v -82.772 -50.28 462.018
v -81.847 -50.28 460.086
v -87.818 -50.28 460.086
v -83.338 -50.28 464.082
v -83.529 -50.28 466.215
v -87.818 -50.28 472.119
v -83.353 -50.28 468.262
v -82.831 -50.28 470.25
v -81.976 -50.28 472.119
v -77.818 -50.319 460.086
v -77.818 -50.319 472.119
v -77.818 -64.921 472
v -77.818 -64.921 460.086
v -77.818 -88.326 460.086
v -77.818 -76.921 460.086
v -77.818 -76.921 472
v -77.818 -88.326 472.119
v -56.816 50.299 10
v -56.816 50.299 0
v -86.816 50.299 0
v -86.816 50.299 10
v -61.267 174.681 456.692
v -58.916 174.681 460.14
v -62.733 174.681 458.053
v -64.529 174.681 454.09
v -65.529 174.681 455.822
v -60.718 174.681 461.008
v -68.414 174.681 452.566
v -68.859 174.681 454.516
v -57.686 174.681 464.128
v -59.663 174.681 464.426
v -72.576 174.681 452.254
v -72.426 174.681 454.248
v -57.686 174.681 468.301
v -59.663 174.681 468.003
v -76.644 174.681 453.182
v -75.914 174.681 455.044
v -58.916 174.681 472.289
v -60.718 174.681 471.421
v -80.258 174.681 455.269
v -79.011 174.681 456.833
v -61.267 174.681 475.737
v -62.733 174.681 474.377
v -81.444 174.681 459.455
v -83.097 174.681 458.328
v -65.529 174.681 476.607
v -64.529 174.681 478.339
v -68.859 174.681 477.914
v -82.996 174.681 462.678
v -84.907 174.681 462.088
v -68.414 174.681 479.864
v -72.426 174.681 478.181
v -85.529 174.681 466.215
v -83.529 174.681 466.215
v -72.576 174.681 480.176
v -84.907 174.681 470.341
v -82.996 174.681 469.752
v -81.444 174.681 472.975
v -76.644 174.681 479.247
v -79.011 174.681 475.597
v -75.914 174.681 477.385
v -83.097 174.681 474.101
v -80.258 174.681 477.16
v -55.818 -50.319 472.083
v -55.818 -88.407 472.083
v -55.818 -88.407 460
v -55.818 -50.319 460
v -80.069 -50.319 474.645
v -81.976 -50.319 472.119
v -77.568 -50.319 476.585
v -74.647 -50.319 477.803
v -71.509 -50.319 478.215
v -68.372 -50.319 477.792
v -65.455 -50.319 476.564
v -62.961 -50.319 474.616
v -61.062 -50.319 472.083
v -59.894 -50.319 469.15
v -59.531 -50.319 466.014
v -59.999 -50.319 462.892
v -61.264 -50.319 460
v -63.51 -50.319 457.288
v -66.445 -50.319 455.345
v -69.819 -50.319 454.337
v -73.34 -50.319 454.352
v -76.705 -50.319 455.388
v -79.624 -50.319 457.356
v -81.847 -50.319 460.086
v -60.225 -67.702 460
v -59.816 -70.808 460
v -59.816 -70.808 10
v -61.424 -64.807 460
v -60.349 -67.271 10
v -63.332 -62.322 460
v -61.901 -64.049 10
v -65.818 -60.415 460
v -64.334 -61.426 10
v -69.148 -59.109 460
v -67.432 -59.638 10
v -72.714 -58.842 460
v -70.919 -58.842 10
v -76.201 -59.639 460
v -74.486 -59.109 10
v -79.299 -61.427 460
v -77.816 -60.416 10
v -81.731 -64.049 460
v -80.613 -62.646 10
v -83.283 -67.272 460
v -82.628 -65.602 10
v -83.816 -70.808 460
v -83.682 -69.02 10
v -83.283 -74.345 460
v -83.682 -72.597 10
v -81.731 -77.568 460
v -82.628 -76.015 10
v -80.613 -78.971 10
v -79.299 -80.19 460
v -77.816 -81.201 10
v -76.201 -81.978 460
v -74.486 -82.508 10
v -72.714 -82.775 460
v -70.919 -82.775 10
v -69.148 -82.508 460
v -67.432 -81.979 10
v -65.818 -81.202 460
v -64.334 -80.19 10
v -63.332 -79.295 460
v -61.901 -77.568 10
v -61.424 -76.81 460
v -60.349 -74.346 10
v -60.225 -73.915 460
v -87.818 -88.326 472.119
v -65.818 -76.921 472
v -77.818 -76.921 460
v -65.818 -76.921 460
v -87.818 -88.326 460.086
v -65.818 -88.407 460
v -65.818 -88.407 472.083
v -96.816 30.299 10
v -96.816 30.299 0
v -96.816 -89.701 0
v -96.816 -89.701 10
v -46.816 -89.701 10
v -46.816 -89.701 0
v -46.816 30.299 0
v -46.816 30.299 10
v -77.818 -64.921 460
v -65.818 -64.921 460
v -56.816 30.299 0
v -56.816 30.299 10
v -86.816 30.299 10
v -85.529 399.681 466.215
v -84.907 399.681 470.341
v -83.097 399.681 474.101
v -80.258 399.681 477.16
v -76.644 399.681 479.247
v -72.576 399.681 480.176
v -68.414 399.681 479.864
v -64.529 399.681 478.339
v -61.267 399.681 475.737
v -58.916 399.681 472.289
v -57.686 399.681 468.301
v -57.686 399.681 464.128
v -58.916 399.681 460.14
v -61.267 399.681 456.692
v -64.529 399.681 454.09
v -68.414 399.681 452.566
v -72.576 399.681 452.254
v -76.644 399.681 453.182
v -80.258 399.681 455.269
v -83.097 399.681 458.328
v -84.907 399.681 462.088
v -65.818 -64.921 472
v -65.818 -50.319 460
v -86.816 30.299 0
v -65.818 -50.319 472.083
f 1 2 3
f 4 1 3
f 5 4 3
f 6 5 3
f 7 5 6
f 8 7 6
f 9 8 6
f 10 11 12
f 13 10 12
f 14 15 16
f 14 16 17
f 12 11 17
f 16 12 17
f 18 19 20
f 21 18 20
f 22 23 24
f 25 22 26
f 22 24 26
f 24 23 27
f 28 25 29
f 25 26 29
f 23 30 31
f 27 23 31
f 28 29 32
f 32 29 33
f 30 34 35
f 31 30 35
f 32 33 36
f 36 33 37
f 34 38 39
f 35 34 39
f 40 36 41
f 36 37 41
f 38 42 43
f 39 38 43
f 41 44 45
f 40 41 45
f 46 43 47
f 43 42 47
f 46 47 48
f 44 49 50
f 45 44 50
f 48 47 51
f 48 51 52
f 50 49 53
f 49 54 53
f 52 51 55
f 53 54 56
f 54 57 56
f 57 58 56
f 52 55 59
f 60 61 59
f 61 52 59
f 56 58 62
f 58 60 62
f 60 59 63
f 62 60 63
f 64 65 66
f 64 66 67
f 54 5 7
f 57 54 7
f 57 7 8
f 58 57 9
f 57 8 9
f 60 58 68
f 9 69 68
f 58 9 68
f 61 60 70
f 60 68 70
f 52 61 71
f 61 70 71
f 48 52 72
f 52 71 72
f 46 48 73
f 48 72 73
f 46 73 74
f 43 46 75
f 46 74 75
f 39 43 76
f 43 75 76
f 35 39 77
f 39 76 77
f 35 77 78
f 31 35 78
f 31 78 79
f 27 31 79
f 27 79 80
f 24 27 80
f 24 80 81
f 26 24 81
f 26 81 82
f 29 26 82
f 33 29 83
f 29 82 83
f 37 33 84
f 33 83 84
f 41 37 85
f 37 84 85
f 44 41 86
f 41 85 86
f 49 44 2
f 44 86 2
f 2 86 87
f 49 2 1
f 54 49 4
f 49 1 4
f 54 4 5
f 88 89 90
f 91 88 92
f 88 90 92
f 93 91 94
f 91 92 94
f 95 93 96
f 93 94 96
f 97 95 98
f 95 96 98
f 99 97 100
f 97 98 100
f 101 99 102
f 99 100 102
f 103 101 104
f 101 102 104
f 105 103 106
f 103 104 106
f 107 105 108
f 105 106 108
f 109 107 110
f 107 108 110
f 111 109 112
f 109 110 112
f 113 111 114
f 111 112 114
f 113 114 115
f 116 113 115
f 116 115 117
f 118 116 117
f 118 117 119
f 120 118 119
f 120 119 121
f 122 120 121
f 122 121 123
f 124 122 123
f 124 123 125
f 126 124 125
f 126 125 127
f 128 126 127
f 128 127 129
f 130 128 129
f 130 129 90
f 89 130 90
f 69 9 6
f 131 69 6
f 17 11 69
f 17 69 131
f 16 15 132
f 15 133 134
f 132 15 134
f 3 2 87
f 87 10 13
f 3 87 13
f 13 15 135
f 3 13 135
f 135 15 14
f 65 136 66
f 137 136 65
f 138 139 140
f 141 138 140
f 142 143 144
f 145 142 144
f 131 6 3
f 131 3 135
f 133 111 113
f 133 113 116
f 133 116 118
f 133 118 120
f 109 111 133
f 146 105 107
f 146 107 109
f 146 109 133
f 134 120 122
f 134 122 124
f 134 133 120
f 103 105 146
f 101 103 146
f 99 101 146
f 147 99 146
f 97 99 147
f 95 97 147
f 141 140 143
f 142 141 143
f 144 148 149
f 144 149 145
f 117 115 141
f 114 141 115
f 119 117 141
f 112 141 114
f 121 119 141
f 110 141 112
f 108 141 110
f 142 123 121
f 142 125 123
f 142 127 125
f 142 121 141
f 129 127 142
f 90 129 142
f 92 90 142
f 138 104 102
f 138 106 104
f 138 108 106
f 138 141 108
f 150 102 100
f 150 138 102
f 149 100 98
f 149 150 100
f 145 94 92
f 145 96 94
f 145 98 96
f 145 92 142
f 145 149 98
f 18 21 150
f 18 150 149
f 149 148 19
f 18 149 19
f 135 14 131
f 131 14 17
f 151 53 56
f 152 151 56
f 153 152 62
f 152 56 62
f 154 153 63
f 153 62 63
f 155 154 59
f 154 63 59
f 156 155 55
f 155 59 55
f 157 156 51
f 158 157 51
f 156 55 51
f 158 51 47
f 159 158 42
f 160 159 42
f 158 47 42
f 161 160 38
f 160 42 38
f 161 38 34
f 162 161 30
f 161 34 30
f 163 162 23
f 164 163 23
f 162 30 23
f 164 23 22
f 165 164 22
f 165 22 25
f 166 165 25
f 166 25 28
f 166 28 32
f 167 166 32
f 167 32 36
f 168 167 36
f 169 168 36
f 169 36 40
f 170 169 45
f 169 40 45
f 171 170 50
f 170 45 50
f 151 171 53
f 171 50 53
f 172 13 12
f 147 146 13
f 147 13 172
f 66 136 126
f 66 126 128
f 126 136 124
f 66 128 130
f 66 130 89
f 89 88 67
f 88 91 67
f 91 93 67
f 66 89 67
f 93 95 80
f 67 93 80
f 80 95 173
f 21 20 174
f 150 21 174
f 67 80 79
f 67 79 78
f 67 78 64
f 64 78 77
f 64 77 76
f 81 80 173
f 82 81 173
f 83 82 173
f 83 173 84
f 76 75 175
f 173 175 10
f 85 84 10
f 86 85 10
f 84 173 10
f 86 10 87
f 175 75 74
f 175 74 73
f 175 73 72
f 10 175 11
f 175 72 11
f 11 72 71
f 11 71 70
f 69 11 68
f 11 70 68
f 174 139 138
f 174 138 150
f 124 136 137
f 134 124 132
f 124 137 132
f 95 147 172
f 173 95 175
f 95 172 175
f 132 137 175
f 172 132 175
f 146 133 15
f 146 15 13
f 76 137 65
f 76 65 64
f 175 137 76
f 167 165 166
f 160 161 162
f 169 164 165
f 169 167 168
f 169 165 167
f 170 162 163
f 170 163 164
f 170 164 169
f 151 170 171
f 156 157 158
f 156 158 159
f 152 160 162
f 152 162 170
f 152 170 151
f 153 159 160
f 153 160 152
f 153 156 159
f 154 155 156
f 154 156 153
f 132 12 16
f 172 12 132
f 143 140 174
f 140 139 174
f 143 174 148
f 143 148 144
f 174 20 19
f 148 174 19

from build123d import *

# Parameters (mm, degrees)
F0_W      = 10
F0_H      = 20
F1_DEPTH  = 10
F2_R      = 12
F3_DEPTH  = 450
F4_W      = 12
F4_H      = 12
F5_DEPTH  = 12
F6_W      = 38.0882956088
F6_H      = 12.0832407475
F7_DEPTH  = 10
F8_W      = 38.0462743342
F8_H      = 12.0327174664
F9_DEPTH  = 10
F10_R     = 12
F11_DEPTH = 225
F12_R     = 14
F13_DEPTH = 225


with BuildPart() as f1:
    # F0 (on Top) → F1 (new body)
    with BuildSketch(Plane.XY):
        Polygon((-96.8159428212, 10.2990681306), (-96.8159428212, -89.7009318694), (-46.8159428212, -89.7009318694), (-46.8159428212, 10.2990681306), (-56.8159428212, 10.2990681306), (-86.8159428212, 10.2990681306), align=None)
        with Locations((-91.8159428212, 20.2990681306)):
            Rectangle(F0_W, F0_H)
        Polygon((-86.8159428212, 30.2990681306), (-86.8159428212, 10.2990681306), (-56.8159428212, 10.2990681306), (-56.8159428212, 30.2990681306), (-56.8159428212, 50.2990681306), (-86.8159428212, 50.2990681306), align=None)
        with Locations((-51.8159428212, 20.2990681306)):
            Rectangle(F0_W, F0_H)
    extrude(amount=F1_DEPTH)

    # F2 (on face) → F3 (join)
    with BuildSketch(Plane.XY.offset(10)):
        with Locations((-71.8159428212, -70.8084776998)):
            Circle(F2_R)
    extrude(amount=F3_DEPTH)

    # F4 (on face) → F5 (join)
    with BuildSketch(Plane.XY.offset(460)):
        with Locations((-71.8180909753, -70.9205174615)):
            Rectangle(F4_W, F4_H)
    extrude(amount=F5_DEPTH)

    # F6 (on face) → F7 (join)
    with BuildSketch(Plane.YZ.offset(-65.8180909753)):
        with Locations((-69.3628769368, 466.0416203737)):
            Rectangle(F6_W, F6_H)
    extrude(amount=F7_DEPTH)

    # F8 (on face) → F9 (join)
    with BuildSketch(Plane(origin=(-77.8180909753, 0, 0), x_dir=(0, -1, 0), z_dir=(-1, 0, 0))):
        with Locations((69.303361699, 466.1028534174)):
            Rectangle(F8_W, F8_H)
    extrude(amount=F9_DEPTH)

    # F10 (on face) → F11 (join)
    with BuildSketch(Plane(origin=(0, -50.3187291324, 0), x_dir=(-1, 0, 0), z_dir=(0, 1, 0))):
        with Locations((71.529455483, 466.2147164345)):
            Circle(F10_R)
    extrude(amount=F11_DEPTH)

    # F12 (on face) → F13 (join)
    with BuildSketch(Plane(origin=(0, 174.6812708676, 0), x_dir=(-1, 0, 0), z_dir=(0, 1, 0))):
        with Locations((71.529455483, 466.2147164345)):
            Circle(F12_R)
    extrude(amount=F13_DEPTH)


solid = f1.part
